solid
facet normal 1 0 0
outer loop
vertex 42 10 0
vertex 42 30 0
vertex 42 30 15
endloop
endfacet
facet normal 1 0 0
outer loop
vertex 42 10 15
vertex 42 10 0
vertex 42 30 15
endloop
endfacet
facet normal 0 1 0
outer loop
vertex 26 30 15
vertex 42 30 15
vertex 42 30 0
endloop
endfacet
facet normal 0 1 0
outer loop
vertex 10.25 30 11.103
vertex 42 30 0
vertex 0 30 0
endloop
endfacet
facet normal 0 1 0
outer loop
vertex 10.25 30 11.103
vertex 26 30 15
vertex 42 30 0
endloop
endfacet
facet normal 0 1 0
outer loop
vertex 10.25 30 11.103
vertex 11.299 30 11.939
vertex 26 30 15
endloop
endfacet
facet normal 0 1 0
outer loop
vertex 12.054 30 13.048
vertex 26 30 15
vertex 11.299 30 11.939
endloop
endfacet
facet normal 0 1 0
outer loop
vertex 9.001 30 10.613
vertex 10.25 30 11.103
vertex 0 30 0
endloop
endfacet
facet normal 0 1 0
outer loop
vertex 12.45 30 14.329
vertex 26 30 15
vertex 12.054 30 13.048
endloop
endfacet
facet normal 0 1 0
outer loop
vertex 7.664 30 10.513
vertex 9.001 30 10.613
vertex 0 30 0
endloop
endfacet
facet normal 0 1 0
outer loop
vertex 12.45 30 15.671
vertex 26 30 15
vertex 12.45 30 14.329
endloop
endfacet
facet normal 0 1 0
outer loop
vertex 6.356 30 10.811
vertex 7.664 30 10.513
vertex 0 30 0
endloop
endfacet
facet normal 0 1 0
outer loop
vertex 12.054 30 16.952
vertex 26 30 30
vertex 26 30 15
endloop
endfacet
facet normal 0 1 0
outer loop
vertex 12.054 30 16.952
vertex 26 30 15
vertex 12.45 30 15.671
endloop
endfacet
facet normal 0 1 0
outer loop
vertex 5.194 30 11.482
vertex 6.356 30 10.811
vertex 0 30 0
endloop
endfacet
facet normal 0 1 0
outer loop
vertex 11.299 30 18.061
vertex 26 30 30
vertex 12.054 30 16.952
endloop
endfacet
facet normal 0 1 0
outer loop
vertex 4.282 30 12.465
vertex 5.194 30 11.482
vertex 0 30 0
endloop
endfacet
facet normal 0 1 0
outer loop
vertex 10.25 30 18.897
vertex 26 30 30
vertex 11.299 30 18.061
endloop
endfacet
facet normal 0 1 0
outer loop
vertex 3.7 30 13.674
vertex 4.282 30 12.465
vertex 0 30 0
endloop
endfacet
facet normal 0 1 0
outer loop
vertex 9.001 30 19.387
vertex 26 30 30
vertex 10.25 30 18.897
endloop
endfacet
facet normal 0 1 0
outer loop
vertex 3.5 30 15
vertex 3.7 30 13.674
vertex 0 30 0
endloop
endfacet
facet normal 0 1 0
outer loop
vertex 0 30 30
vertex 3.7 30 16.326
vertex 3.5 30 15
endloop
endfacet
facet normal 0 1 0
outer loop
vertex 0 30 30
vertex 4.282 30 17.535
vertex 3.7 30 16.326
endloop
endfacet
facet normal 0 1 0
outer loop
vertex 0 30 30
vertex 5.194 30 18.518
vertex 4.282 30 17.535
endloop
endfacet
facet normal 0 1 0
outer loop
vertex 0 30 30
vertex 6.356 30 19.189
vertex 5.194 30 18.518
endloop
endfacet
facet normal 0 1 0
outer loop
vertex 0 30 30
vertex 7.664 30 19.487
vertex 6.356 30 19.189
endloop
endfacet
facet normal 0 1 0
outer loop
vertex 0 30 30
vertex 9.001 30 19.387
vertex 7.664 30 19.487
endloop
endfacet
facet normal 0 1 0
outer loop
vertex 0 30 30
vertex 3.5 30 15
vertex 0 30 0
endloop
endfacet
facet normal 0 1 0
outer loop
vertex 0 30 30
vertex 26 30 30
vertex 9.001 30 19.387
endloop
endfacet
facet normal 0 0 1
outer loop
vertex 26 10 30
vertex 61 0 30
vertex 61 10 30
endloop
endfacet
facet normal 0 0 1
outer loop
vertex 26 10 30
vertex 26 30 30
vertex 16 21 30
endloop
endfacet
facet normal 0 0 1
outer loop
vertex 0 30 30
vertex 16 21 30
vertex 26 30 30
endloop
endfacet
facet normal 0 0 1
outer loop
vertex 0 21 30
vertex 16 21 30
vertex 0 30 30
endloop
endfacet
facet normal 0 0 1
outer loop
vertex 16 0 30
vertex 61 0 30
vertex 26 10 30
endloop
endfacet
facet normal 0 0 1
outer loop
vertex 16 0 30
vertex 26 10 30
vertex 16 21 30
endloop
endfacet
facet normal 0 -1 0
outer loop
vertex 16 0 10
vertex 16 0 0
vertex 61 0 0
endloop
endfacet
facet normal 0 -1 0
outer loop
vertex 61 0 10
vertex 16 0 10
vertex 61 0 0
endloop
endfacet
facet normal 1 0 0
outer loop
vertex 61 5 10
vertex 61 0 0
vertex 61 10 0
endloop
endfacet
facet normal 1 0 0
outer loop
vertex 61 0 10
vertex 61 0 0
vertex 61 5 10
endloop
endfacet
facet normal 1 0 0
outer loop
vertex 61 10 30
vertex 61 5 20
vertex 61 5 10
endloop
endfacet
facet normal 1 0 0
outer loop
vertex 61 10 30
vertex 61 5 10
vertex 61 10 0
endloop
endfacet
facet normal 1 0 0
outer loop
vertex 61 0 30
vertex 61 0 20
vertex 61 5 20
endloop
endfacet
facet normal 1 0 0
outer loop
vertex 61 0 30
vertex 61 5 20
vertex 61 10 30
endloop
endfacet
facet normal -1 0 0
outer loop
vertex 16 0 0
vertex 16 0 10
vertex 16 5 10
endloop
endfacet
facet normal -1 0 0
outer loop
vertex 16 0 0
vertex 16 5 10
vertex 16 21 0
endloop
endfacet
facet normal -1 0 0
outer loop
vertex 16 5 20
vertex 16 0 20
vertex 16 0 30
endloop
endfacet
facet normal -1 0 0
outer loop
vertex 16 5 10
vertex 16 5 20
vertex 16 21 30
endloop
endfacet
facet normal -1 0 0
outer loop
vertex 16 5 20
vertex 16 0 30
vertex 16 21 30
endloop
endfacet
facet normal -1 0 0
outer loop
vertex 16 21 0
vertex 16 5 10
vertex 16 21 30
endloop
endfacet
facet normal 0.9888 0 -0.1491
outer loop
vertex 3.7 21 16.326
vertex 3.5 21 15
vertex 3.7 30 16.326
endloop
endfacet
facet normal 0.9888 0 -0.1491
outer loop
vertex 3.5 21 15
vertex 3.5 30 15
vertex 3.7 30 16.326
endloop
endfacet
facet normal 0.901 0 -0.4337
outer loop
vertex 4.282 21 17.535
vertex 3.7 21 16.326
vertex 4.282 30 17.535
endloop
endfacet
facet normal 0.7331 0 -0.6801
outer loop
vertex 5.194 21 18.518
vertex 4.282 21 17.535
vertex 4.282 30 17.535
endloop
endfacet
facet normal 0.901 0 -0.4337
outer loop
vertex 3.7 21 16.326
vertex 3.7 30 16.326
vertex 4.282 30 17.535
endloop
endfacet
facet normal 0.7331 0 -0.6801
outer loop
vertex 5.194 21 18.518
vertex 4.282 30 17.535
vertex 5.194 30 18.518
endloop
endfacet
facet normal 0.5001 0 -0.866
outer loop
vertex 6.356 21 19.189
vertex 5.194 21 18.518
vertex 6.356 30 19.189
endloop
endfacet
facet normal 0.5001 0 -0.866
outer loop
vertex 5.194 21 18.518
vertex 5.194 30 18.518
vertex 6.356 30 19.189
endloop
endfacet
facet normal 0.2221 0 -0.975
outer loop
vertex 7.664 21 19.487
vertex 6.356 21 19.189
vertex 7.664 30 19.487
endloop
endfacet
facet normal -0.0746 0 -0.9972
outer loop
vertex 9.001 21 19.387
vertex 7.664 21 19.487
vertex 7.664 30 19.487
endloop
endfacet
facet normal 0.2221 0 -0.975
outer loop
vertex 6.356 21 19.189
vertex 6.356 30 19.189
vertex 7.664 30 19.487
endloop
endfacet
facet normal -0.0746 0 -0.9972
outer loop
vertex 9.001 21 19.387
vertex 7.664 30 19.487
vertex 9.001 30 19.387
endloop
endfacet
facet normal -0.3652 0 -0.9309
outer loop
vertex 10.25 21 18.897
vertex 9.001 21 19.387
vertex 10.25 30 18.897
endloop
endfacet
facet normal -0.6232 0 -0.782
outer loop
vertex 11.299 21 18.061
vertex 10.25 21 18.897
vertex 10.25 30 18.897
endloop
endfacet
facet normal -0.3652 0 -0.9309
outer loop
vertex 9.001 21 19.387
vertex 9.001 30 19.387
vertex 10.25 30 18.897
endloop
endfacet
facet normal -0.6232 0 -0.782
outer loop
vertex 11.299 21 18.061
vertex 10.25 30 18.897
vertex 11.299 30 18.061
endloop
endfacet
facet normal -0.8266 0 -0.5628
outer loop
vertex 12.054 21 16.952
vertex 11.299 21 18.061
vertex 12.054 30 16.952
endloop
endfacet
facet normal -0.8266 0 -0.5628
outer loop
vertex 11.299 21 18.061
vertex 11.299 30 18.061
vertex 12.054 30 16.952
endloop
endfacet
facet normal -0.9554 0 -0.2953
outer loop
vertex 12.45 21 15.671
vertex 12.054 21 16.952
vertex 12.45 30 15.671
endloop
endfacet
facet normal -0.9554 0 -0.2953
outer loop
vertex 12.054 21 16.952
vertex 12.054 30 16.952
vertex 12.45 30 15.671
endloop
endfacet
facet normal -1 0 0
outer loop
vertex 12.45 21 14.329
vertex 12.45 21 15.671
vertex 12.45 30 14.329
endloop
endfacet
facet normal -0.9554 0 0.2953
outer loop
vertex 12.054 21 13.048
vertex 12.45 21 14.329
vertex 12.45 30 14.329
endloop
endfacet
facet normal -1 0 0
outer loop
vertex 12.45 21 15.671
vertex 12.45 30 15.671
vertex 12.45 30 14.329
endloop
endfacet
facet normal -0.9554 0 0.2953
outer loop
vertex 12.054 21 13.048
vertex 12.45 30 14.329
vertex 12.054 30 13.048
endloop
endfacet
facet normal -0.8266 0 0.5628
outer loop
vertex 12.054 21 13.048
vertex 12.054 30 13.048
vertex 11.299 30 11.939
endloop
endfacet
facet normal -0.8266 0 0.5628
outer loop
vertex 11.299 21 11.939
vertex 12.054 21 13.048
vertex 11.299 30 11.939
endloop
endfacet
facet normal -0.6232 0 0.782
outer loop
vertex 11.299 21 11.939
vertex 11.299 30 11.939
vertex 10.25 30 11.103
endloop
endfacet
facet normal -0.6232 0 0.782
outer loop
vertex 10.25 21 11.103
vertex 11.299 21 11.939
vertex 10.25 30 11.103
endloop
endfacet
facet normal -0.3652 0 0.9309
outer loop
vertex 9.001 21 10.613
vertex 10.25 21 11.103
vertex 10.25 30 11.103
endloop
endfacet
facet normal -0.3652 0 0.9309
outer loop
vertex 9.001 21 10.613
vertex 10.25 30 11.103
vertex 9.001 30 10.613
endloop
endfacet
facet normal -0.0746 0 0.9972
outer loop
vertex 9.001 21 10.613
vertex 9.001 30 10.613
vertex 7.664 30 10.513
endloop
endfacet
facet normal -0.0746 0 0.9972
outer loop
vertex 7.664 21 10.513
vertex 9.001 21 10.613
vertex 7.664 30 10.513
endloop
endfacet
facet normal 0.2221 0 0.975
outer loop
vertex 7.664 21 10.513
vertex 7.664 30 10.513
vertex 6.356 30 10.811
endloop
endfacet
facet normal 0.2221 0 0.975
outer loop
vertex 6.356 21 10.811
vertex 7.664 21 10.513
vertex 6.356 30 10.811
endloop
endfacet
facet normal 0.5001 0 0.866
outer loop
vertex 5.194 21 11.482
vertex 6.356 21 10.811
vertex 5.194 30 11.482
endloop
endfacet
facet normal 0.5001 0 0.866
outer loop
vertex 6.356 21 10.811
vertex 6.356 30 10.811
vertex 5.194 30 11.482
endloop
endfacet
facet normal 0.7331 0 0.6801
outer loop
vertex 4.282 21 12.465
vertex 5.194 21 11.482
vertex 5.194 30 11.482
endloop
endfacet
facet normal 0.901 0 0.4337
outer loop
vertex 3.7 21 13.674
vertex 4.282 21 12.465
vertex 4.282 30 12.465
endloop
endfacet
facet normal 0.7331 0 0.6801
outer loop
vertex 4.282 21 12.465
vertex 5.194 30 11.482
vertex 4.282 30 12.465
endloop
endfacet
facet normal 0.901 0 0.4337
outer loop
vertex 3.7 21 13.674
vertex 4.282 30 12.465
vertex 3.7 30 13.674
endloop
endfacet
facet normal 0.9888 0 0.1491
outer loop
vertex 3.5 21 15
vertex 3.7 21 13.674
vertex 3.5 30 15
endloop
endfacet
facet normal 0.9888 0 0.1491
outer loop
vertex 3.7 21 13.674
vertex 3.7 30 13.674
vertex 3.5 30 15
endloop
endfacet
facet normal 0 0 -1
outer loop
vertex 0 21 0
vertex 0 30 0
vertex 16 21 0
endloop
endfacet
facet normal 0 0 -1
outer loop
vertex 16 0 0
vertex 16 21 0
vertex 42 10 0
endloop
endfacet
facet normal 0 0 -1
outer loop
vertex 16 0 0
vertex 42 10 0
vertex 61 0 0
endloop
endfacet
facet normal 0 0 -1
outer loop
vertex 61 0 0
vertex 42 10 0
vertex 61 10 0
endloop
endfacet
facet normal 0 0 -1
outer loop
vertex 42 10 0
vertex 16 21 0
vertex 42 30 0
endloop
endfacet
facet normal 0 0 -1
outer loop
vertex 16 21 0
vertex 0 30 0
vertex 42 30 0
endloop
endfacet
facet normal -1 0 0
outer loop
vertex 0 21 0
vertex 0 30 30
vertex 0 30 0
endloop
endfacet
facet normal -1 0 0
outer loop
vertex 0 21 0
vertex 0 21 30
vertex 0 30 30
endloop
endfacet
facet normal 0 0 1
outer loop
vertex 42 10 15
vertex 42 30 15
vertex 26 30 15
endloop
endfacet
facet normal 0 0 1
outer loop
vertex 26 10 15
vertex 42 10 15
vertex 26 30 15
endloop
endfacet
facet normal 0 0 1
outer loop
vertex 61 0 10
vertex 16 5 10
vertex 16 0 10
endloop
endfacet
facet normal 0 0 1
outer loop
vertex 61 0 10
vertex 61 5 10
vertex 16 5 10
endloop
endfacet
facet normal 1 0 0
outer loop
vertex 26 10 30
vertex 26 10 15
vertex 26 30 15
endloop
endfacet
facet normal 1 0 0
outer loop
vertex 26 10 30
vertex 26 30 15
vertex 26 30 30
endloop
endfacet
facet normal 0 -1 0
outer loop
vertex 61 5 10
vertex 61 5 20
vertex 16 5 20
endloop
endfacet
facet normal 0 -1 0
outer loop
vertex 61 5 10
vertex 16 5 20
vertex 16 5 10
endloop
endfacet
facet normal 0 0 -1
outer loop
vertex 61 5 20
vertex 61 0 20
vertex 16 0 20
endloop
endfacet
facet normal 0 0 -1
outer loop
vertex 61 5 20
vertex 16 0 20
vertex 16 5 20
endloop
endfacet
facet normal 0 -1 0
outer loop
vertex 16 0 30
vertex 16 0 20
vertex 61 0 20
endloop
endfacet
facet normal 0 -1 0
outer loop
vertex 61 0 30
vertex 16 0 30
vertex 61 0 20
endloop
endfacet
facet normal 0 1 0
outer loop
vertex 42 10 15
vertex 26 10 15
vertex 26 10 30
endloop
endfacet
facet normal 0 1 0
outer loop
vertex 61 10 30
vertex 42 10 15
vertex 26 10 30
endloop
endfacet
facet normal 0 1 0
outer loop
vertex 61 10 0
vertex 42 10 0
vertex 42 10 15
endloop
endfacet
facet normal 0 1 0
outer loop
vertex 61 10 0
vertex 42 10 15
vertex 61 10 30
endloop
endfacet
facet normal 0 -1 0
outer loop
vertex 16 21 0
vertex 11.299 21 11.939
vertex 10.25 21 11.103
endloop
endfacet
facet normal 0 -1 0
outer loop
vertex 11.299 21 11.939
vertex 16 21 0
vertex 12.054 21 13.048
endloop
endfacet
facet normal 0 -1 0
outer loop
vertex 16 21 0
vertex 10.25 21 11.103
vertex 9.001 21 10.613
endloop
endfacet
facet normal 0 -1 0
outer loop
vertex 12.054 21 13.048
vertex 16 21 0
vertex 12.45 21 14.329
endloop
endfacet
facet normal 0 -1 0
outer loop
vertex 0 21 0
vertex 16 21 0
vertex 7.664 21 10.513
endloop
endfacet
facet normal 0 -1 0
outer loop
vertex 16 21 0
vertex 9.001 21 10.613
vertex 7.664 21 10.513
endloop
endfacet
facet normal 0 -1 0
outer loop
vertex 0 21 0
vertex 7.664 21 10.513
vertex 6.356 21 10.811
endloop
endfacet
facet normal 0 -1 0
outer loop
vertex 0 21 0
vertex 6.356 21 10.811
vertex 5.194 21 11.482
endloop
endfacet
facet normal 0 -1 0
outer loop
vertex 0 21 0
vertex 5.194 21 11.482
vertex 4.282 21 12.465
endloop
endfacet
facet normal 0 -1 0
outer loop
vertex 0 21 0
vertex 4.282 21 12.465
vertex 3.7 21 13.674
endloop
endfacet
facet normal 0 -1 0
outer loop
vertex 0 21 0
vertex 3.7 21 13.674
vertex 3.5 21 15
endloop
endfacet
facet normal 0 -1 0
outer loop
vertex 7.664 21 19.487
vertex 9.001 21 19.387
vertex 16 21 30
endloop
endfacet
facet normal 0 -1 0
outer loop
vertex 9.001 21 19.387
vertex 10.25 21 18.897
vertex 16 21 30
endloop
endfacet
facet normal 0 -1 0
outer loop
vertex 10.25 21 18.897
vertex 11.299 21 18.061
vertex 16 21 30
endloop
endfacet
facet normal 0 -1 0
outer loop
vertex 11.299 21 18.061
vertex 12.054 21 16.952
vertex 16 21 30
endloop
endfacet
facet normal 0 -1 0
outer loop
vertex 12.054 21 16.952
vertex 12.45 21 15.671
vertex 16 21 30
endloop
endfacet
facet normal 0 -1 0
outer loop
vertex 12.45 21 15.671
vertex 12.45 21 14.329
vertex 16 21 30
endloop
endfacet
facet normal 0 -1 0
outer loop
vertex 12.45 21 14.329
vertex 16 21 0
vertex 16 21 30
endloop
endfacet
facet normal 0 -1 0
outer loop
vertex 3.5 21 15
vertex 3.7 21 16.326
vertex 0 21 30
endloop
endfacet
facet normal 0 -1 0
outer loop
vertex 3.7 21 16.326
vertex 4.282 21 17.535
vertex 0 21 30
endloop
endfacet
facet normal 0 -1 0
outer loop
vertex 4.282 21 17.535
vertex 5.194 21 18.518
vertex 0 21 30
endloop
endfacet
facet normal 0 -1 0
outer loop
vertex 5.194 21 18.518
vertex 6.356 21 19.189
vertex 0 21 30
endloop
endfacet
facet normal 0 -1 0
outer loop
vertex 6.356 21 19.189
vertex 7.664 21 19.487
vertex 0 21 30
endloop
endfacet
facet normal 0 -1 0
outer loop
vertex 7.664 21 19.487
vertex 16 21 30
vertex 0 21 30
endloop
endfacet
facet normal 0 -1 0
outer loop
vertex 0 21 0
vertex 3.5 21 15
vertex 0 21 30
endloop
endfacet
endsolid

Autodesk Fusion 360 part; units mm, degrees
sketch "Sketch1" plane through (0, 0, 0) normal (0, 1, 0) x (1, 0, 0)
  line L0 (0, 0) -> (61, 0)
  line L1 (61, 0) -> (61, -30)
  line L2 (61, -30) -> (0, -30)
  line L3 (0, -30) -> (0, 0)
  dimension "d1" = 61
  dimension "d2" = 30
extrude "Extrude1" add sketch "Sketch1" along normal blind 10
sketch "Sketch2" plane through (0, 10, 0) normal (0, 1, 0) x (-1, 0, 0)
  line L0 (0, 30) -> (-61, 30)
  line L1 (-61, 30) -> (-61, 0)
  line L2 (-61, 0) -> (0, 0)
  line L3 (0, 0) -> (0, 30)
  line L4 (0, 0) -> (-26, 0)
  line L5 (-26, 0) -> (-26, 30)
  line L6 (-26, 30) -> (0, 30)
  line L7 (0, 30) -> (0, 0)
  dimension "d5" = 26
extrude "Extrude2" add sketch "Sketch2" along normal blind 20 contours L0 L2 L3 L4 L5 L6 L7
sketch "Sketch3" plane through (0, 30, 0) normal (0, 1, 0) x (-1, 0, 0)
  line L0 (0, 30) -> (-26, 30)
  line L1 (-26, 30) -> (-26, 0)
  line L2 (-26, 0) -> (0, 0)
  line L3 (0, 0) -> (0, 30)
  line L4 (-26, 0) -> (-42, 0)
  line L5 (-42, 0) -> (-42, 15)
  line L6 (-42, 15) -> (-26, 15)
  line L7 (-26, 15) -> (-26, 0)
  dimension "d8" = 16
  dimension "d9" = 15
extrude "Extrude3" add sketch "Sketch3" against normal up to surface (20 mm away) contours L1 L4 L5 L6 L7
sketch "Sketch4" plane through (0, 0, 30) normal (0, 0, 1) x (1, 0, 0)
  line L0 (0, 0) -> (61, 0)
  line L1 (61, 0) -> (61, 10)
  line L2 (61, 10) -> (26, 10)
  line L3 (26, 10) -> (26, 30)
  line L4 (26, 30) -> (0, 30)
  line L5 (0, 30) -> (0, 0)
  line L6 (0, 0) -> (16, 0)
  line L7 (16, 0) -> (16, 21)
  line L8 (16, 21) -> (0, 21)
  line L9 (0, 21) -> (0, 0)
  dimension "d12" = 16
  dimension "d13" = 21
extrude "Extrude4" cut sketch "Sketch4" against normal blind 30 contours L0 L5 L6 L7 L8 L9
sketch "Sketch5" plane through (0, 30, 0) normal (0, 1, 0) x (-1, 0, 0)
  line L0 (0, 30) -> (-26, 30)
  line L1 (-26, 30) -> (-26, 15)
  line L2 (-26, 15) -> (-42, 15)
  line L3 (-42, 15) -> (-42, 0)
  line L4 (-42, 0) -> (0, 0)
  line L5 (0, 0) -> (0, 30)
  line L6 (28.1028, 15) -> (-28.1028, 15) construction
  circle A0 centre (-8, 15) radius 4.5
  dimension "d16" = 9
  dimension "d17" = 8
extrude "Extrude5" cut sketch "Sketch5" against normal blind 9 contours A0
sketch "Sketch6" plane through (61, 0, 0) normal (1, 0, 0) x (0, 0, -1)
  line L0 (-30, 0) -> (0, 0)
  line L1 (0, 0) -> (0, 10)
  line L2 (0, 10) -> (-30, 10)
  line L3 (-30, 10) -> (-30, 0)
  line L4 (-20, 0) -> (-20, 5)
  line L5 (-20, 5) -> (-10, 5)
  line L6 (-10, 5) -> (-10, 0)
  dimension "d20" = 10
  dimension "d21" = 5
  dimension "d22" = 5
  dimension "d23" = 10
extrude "Extrude6" cut sketch "Sketch6" against normal blind 45 contours L0 L4 L5 L6
